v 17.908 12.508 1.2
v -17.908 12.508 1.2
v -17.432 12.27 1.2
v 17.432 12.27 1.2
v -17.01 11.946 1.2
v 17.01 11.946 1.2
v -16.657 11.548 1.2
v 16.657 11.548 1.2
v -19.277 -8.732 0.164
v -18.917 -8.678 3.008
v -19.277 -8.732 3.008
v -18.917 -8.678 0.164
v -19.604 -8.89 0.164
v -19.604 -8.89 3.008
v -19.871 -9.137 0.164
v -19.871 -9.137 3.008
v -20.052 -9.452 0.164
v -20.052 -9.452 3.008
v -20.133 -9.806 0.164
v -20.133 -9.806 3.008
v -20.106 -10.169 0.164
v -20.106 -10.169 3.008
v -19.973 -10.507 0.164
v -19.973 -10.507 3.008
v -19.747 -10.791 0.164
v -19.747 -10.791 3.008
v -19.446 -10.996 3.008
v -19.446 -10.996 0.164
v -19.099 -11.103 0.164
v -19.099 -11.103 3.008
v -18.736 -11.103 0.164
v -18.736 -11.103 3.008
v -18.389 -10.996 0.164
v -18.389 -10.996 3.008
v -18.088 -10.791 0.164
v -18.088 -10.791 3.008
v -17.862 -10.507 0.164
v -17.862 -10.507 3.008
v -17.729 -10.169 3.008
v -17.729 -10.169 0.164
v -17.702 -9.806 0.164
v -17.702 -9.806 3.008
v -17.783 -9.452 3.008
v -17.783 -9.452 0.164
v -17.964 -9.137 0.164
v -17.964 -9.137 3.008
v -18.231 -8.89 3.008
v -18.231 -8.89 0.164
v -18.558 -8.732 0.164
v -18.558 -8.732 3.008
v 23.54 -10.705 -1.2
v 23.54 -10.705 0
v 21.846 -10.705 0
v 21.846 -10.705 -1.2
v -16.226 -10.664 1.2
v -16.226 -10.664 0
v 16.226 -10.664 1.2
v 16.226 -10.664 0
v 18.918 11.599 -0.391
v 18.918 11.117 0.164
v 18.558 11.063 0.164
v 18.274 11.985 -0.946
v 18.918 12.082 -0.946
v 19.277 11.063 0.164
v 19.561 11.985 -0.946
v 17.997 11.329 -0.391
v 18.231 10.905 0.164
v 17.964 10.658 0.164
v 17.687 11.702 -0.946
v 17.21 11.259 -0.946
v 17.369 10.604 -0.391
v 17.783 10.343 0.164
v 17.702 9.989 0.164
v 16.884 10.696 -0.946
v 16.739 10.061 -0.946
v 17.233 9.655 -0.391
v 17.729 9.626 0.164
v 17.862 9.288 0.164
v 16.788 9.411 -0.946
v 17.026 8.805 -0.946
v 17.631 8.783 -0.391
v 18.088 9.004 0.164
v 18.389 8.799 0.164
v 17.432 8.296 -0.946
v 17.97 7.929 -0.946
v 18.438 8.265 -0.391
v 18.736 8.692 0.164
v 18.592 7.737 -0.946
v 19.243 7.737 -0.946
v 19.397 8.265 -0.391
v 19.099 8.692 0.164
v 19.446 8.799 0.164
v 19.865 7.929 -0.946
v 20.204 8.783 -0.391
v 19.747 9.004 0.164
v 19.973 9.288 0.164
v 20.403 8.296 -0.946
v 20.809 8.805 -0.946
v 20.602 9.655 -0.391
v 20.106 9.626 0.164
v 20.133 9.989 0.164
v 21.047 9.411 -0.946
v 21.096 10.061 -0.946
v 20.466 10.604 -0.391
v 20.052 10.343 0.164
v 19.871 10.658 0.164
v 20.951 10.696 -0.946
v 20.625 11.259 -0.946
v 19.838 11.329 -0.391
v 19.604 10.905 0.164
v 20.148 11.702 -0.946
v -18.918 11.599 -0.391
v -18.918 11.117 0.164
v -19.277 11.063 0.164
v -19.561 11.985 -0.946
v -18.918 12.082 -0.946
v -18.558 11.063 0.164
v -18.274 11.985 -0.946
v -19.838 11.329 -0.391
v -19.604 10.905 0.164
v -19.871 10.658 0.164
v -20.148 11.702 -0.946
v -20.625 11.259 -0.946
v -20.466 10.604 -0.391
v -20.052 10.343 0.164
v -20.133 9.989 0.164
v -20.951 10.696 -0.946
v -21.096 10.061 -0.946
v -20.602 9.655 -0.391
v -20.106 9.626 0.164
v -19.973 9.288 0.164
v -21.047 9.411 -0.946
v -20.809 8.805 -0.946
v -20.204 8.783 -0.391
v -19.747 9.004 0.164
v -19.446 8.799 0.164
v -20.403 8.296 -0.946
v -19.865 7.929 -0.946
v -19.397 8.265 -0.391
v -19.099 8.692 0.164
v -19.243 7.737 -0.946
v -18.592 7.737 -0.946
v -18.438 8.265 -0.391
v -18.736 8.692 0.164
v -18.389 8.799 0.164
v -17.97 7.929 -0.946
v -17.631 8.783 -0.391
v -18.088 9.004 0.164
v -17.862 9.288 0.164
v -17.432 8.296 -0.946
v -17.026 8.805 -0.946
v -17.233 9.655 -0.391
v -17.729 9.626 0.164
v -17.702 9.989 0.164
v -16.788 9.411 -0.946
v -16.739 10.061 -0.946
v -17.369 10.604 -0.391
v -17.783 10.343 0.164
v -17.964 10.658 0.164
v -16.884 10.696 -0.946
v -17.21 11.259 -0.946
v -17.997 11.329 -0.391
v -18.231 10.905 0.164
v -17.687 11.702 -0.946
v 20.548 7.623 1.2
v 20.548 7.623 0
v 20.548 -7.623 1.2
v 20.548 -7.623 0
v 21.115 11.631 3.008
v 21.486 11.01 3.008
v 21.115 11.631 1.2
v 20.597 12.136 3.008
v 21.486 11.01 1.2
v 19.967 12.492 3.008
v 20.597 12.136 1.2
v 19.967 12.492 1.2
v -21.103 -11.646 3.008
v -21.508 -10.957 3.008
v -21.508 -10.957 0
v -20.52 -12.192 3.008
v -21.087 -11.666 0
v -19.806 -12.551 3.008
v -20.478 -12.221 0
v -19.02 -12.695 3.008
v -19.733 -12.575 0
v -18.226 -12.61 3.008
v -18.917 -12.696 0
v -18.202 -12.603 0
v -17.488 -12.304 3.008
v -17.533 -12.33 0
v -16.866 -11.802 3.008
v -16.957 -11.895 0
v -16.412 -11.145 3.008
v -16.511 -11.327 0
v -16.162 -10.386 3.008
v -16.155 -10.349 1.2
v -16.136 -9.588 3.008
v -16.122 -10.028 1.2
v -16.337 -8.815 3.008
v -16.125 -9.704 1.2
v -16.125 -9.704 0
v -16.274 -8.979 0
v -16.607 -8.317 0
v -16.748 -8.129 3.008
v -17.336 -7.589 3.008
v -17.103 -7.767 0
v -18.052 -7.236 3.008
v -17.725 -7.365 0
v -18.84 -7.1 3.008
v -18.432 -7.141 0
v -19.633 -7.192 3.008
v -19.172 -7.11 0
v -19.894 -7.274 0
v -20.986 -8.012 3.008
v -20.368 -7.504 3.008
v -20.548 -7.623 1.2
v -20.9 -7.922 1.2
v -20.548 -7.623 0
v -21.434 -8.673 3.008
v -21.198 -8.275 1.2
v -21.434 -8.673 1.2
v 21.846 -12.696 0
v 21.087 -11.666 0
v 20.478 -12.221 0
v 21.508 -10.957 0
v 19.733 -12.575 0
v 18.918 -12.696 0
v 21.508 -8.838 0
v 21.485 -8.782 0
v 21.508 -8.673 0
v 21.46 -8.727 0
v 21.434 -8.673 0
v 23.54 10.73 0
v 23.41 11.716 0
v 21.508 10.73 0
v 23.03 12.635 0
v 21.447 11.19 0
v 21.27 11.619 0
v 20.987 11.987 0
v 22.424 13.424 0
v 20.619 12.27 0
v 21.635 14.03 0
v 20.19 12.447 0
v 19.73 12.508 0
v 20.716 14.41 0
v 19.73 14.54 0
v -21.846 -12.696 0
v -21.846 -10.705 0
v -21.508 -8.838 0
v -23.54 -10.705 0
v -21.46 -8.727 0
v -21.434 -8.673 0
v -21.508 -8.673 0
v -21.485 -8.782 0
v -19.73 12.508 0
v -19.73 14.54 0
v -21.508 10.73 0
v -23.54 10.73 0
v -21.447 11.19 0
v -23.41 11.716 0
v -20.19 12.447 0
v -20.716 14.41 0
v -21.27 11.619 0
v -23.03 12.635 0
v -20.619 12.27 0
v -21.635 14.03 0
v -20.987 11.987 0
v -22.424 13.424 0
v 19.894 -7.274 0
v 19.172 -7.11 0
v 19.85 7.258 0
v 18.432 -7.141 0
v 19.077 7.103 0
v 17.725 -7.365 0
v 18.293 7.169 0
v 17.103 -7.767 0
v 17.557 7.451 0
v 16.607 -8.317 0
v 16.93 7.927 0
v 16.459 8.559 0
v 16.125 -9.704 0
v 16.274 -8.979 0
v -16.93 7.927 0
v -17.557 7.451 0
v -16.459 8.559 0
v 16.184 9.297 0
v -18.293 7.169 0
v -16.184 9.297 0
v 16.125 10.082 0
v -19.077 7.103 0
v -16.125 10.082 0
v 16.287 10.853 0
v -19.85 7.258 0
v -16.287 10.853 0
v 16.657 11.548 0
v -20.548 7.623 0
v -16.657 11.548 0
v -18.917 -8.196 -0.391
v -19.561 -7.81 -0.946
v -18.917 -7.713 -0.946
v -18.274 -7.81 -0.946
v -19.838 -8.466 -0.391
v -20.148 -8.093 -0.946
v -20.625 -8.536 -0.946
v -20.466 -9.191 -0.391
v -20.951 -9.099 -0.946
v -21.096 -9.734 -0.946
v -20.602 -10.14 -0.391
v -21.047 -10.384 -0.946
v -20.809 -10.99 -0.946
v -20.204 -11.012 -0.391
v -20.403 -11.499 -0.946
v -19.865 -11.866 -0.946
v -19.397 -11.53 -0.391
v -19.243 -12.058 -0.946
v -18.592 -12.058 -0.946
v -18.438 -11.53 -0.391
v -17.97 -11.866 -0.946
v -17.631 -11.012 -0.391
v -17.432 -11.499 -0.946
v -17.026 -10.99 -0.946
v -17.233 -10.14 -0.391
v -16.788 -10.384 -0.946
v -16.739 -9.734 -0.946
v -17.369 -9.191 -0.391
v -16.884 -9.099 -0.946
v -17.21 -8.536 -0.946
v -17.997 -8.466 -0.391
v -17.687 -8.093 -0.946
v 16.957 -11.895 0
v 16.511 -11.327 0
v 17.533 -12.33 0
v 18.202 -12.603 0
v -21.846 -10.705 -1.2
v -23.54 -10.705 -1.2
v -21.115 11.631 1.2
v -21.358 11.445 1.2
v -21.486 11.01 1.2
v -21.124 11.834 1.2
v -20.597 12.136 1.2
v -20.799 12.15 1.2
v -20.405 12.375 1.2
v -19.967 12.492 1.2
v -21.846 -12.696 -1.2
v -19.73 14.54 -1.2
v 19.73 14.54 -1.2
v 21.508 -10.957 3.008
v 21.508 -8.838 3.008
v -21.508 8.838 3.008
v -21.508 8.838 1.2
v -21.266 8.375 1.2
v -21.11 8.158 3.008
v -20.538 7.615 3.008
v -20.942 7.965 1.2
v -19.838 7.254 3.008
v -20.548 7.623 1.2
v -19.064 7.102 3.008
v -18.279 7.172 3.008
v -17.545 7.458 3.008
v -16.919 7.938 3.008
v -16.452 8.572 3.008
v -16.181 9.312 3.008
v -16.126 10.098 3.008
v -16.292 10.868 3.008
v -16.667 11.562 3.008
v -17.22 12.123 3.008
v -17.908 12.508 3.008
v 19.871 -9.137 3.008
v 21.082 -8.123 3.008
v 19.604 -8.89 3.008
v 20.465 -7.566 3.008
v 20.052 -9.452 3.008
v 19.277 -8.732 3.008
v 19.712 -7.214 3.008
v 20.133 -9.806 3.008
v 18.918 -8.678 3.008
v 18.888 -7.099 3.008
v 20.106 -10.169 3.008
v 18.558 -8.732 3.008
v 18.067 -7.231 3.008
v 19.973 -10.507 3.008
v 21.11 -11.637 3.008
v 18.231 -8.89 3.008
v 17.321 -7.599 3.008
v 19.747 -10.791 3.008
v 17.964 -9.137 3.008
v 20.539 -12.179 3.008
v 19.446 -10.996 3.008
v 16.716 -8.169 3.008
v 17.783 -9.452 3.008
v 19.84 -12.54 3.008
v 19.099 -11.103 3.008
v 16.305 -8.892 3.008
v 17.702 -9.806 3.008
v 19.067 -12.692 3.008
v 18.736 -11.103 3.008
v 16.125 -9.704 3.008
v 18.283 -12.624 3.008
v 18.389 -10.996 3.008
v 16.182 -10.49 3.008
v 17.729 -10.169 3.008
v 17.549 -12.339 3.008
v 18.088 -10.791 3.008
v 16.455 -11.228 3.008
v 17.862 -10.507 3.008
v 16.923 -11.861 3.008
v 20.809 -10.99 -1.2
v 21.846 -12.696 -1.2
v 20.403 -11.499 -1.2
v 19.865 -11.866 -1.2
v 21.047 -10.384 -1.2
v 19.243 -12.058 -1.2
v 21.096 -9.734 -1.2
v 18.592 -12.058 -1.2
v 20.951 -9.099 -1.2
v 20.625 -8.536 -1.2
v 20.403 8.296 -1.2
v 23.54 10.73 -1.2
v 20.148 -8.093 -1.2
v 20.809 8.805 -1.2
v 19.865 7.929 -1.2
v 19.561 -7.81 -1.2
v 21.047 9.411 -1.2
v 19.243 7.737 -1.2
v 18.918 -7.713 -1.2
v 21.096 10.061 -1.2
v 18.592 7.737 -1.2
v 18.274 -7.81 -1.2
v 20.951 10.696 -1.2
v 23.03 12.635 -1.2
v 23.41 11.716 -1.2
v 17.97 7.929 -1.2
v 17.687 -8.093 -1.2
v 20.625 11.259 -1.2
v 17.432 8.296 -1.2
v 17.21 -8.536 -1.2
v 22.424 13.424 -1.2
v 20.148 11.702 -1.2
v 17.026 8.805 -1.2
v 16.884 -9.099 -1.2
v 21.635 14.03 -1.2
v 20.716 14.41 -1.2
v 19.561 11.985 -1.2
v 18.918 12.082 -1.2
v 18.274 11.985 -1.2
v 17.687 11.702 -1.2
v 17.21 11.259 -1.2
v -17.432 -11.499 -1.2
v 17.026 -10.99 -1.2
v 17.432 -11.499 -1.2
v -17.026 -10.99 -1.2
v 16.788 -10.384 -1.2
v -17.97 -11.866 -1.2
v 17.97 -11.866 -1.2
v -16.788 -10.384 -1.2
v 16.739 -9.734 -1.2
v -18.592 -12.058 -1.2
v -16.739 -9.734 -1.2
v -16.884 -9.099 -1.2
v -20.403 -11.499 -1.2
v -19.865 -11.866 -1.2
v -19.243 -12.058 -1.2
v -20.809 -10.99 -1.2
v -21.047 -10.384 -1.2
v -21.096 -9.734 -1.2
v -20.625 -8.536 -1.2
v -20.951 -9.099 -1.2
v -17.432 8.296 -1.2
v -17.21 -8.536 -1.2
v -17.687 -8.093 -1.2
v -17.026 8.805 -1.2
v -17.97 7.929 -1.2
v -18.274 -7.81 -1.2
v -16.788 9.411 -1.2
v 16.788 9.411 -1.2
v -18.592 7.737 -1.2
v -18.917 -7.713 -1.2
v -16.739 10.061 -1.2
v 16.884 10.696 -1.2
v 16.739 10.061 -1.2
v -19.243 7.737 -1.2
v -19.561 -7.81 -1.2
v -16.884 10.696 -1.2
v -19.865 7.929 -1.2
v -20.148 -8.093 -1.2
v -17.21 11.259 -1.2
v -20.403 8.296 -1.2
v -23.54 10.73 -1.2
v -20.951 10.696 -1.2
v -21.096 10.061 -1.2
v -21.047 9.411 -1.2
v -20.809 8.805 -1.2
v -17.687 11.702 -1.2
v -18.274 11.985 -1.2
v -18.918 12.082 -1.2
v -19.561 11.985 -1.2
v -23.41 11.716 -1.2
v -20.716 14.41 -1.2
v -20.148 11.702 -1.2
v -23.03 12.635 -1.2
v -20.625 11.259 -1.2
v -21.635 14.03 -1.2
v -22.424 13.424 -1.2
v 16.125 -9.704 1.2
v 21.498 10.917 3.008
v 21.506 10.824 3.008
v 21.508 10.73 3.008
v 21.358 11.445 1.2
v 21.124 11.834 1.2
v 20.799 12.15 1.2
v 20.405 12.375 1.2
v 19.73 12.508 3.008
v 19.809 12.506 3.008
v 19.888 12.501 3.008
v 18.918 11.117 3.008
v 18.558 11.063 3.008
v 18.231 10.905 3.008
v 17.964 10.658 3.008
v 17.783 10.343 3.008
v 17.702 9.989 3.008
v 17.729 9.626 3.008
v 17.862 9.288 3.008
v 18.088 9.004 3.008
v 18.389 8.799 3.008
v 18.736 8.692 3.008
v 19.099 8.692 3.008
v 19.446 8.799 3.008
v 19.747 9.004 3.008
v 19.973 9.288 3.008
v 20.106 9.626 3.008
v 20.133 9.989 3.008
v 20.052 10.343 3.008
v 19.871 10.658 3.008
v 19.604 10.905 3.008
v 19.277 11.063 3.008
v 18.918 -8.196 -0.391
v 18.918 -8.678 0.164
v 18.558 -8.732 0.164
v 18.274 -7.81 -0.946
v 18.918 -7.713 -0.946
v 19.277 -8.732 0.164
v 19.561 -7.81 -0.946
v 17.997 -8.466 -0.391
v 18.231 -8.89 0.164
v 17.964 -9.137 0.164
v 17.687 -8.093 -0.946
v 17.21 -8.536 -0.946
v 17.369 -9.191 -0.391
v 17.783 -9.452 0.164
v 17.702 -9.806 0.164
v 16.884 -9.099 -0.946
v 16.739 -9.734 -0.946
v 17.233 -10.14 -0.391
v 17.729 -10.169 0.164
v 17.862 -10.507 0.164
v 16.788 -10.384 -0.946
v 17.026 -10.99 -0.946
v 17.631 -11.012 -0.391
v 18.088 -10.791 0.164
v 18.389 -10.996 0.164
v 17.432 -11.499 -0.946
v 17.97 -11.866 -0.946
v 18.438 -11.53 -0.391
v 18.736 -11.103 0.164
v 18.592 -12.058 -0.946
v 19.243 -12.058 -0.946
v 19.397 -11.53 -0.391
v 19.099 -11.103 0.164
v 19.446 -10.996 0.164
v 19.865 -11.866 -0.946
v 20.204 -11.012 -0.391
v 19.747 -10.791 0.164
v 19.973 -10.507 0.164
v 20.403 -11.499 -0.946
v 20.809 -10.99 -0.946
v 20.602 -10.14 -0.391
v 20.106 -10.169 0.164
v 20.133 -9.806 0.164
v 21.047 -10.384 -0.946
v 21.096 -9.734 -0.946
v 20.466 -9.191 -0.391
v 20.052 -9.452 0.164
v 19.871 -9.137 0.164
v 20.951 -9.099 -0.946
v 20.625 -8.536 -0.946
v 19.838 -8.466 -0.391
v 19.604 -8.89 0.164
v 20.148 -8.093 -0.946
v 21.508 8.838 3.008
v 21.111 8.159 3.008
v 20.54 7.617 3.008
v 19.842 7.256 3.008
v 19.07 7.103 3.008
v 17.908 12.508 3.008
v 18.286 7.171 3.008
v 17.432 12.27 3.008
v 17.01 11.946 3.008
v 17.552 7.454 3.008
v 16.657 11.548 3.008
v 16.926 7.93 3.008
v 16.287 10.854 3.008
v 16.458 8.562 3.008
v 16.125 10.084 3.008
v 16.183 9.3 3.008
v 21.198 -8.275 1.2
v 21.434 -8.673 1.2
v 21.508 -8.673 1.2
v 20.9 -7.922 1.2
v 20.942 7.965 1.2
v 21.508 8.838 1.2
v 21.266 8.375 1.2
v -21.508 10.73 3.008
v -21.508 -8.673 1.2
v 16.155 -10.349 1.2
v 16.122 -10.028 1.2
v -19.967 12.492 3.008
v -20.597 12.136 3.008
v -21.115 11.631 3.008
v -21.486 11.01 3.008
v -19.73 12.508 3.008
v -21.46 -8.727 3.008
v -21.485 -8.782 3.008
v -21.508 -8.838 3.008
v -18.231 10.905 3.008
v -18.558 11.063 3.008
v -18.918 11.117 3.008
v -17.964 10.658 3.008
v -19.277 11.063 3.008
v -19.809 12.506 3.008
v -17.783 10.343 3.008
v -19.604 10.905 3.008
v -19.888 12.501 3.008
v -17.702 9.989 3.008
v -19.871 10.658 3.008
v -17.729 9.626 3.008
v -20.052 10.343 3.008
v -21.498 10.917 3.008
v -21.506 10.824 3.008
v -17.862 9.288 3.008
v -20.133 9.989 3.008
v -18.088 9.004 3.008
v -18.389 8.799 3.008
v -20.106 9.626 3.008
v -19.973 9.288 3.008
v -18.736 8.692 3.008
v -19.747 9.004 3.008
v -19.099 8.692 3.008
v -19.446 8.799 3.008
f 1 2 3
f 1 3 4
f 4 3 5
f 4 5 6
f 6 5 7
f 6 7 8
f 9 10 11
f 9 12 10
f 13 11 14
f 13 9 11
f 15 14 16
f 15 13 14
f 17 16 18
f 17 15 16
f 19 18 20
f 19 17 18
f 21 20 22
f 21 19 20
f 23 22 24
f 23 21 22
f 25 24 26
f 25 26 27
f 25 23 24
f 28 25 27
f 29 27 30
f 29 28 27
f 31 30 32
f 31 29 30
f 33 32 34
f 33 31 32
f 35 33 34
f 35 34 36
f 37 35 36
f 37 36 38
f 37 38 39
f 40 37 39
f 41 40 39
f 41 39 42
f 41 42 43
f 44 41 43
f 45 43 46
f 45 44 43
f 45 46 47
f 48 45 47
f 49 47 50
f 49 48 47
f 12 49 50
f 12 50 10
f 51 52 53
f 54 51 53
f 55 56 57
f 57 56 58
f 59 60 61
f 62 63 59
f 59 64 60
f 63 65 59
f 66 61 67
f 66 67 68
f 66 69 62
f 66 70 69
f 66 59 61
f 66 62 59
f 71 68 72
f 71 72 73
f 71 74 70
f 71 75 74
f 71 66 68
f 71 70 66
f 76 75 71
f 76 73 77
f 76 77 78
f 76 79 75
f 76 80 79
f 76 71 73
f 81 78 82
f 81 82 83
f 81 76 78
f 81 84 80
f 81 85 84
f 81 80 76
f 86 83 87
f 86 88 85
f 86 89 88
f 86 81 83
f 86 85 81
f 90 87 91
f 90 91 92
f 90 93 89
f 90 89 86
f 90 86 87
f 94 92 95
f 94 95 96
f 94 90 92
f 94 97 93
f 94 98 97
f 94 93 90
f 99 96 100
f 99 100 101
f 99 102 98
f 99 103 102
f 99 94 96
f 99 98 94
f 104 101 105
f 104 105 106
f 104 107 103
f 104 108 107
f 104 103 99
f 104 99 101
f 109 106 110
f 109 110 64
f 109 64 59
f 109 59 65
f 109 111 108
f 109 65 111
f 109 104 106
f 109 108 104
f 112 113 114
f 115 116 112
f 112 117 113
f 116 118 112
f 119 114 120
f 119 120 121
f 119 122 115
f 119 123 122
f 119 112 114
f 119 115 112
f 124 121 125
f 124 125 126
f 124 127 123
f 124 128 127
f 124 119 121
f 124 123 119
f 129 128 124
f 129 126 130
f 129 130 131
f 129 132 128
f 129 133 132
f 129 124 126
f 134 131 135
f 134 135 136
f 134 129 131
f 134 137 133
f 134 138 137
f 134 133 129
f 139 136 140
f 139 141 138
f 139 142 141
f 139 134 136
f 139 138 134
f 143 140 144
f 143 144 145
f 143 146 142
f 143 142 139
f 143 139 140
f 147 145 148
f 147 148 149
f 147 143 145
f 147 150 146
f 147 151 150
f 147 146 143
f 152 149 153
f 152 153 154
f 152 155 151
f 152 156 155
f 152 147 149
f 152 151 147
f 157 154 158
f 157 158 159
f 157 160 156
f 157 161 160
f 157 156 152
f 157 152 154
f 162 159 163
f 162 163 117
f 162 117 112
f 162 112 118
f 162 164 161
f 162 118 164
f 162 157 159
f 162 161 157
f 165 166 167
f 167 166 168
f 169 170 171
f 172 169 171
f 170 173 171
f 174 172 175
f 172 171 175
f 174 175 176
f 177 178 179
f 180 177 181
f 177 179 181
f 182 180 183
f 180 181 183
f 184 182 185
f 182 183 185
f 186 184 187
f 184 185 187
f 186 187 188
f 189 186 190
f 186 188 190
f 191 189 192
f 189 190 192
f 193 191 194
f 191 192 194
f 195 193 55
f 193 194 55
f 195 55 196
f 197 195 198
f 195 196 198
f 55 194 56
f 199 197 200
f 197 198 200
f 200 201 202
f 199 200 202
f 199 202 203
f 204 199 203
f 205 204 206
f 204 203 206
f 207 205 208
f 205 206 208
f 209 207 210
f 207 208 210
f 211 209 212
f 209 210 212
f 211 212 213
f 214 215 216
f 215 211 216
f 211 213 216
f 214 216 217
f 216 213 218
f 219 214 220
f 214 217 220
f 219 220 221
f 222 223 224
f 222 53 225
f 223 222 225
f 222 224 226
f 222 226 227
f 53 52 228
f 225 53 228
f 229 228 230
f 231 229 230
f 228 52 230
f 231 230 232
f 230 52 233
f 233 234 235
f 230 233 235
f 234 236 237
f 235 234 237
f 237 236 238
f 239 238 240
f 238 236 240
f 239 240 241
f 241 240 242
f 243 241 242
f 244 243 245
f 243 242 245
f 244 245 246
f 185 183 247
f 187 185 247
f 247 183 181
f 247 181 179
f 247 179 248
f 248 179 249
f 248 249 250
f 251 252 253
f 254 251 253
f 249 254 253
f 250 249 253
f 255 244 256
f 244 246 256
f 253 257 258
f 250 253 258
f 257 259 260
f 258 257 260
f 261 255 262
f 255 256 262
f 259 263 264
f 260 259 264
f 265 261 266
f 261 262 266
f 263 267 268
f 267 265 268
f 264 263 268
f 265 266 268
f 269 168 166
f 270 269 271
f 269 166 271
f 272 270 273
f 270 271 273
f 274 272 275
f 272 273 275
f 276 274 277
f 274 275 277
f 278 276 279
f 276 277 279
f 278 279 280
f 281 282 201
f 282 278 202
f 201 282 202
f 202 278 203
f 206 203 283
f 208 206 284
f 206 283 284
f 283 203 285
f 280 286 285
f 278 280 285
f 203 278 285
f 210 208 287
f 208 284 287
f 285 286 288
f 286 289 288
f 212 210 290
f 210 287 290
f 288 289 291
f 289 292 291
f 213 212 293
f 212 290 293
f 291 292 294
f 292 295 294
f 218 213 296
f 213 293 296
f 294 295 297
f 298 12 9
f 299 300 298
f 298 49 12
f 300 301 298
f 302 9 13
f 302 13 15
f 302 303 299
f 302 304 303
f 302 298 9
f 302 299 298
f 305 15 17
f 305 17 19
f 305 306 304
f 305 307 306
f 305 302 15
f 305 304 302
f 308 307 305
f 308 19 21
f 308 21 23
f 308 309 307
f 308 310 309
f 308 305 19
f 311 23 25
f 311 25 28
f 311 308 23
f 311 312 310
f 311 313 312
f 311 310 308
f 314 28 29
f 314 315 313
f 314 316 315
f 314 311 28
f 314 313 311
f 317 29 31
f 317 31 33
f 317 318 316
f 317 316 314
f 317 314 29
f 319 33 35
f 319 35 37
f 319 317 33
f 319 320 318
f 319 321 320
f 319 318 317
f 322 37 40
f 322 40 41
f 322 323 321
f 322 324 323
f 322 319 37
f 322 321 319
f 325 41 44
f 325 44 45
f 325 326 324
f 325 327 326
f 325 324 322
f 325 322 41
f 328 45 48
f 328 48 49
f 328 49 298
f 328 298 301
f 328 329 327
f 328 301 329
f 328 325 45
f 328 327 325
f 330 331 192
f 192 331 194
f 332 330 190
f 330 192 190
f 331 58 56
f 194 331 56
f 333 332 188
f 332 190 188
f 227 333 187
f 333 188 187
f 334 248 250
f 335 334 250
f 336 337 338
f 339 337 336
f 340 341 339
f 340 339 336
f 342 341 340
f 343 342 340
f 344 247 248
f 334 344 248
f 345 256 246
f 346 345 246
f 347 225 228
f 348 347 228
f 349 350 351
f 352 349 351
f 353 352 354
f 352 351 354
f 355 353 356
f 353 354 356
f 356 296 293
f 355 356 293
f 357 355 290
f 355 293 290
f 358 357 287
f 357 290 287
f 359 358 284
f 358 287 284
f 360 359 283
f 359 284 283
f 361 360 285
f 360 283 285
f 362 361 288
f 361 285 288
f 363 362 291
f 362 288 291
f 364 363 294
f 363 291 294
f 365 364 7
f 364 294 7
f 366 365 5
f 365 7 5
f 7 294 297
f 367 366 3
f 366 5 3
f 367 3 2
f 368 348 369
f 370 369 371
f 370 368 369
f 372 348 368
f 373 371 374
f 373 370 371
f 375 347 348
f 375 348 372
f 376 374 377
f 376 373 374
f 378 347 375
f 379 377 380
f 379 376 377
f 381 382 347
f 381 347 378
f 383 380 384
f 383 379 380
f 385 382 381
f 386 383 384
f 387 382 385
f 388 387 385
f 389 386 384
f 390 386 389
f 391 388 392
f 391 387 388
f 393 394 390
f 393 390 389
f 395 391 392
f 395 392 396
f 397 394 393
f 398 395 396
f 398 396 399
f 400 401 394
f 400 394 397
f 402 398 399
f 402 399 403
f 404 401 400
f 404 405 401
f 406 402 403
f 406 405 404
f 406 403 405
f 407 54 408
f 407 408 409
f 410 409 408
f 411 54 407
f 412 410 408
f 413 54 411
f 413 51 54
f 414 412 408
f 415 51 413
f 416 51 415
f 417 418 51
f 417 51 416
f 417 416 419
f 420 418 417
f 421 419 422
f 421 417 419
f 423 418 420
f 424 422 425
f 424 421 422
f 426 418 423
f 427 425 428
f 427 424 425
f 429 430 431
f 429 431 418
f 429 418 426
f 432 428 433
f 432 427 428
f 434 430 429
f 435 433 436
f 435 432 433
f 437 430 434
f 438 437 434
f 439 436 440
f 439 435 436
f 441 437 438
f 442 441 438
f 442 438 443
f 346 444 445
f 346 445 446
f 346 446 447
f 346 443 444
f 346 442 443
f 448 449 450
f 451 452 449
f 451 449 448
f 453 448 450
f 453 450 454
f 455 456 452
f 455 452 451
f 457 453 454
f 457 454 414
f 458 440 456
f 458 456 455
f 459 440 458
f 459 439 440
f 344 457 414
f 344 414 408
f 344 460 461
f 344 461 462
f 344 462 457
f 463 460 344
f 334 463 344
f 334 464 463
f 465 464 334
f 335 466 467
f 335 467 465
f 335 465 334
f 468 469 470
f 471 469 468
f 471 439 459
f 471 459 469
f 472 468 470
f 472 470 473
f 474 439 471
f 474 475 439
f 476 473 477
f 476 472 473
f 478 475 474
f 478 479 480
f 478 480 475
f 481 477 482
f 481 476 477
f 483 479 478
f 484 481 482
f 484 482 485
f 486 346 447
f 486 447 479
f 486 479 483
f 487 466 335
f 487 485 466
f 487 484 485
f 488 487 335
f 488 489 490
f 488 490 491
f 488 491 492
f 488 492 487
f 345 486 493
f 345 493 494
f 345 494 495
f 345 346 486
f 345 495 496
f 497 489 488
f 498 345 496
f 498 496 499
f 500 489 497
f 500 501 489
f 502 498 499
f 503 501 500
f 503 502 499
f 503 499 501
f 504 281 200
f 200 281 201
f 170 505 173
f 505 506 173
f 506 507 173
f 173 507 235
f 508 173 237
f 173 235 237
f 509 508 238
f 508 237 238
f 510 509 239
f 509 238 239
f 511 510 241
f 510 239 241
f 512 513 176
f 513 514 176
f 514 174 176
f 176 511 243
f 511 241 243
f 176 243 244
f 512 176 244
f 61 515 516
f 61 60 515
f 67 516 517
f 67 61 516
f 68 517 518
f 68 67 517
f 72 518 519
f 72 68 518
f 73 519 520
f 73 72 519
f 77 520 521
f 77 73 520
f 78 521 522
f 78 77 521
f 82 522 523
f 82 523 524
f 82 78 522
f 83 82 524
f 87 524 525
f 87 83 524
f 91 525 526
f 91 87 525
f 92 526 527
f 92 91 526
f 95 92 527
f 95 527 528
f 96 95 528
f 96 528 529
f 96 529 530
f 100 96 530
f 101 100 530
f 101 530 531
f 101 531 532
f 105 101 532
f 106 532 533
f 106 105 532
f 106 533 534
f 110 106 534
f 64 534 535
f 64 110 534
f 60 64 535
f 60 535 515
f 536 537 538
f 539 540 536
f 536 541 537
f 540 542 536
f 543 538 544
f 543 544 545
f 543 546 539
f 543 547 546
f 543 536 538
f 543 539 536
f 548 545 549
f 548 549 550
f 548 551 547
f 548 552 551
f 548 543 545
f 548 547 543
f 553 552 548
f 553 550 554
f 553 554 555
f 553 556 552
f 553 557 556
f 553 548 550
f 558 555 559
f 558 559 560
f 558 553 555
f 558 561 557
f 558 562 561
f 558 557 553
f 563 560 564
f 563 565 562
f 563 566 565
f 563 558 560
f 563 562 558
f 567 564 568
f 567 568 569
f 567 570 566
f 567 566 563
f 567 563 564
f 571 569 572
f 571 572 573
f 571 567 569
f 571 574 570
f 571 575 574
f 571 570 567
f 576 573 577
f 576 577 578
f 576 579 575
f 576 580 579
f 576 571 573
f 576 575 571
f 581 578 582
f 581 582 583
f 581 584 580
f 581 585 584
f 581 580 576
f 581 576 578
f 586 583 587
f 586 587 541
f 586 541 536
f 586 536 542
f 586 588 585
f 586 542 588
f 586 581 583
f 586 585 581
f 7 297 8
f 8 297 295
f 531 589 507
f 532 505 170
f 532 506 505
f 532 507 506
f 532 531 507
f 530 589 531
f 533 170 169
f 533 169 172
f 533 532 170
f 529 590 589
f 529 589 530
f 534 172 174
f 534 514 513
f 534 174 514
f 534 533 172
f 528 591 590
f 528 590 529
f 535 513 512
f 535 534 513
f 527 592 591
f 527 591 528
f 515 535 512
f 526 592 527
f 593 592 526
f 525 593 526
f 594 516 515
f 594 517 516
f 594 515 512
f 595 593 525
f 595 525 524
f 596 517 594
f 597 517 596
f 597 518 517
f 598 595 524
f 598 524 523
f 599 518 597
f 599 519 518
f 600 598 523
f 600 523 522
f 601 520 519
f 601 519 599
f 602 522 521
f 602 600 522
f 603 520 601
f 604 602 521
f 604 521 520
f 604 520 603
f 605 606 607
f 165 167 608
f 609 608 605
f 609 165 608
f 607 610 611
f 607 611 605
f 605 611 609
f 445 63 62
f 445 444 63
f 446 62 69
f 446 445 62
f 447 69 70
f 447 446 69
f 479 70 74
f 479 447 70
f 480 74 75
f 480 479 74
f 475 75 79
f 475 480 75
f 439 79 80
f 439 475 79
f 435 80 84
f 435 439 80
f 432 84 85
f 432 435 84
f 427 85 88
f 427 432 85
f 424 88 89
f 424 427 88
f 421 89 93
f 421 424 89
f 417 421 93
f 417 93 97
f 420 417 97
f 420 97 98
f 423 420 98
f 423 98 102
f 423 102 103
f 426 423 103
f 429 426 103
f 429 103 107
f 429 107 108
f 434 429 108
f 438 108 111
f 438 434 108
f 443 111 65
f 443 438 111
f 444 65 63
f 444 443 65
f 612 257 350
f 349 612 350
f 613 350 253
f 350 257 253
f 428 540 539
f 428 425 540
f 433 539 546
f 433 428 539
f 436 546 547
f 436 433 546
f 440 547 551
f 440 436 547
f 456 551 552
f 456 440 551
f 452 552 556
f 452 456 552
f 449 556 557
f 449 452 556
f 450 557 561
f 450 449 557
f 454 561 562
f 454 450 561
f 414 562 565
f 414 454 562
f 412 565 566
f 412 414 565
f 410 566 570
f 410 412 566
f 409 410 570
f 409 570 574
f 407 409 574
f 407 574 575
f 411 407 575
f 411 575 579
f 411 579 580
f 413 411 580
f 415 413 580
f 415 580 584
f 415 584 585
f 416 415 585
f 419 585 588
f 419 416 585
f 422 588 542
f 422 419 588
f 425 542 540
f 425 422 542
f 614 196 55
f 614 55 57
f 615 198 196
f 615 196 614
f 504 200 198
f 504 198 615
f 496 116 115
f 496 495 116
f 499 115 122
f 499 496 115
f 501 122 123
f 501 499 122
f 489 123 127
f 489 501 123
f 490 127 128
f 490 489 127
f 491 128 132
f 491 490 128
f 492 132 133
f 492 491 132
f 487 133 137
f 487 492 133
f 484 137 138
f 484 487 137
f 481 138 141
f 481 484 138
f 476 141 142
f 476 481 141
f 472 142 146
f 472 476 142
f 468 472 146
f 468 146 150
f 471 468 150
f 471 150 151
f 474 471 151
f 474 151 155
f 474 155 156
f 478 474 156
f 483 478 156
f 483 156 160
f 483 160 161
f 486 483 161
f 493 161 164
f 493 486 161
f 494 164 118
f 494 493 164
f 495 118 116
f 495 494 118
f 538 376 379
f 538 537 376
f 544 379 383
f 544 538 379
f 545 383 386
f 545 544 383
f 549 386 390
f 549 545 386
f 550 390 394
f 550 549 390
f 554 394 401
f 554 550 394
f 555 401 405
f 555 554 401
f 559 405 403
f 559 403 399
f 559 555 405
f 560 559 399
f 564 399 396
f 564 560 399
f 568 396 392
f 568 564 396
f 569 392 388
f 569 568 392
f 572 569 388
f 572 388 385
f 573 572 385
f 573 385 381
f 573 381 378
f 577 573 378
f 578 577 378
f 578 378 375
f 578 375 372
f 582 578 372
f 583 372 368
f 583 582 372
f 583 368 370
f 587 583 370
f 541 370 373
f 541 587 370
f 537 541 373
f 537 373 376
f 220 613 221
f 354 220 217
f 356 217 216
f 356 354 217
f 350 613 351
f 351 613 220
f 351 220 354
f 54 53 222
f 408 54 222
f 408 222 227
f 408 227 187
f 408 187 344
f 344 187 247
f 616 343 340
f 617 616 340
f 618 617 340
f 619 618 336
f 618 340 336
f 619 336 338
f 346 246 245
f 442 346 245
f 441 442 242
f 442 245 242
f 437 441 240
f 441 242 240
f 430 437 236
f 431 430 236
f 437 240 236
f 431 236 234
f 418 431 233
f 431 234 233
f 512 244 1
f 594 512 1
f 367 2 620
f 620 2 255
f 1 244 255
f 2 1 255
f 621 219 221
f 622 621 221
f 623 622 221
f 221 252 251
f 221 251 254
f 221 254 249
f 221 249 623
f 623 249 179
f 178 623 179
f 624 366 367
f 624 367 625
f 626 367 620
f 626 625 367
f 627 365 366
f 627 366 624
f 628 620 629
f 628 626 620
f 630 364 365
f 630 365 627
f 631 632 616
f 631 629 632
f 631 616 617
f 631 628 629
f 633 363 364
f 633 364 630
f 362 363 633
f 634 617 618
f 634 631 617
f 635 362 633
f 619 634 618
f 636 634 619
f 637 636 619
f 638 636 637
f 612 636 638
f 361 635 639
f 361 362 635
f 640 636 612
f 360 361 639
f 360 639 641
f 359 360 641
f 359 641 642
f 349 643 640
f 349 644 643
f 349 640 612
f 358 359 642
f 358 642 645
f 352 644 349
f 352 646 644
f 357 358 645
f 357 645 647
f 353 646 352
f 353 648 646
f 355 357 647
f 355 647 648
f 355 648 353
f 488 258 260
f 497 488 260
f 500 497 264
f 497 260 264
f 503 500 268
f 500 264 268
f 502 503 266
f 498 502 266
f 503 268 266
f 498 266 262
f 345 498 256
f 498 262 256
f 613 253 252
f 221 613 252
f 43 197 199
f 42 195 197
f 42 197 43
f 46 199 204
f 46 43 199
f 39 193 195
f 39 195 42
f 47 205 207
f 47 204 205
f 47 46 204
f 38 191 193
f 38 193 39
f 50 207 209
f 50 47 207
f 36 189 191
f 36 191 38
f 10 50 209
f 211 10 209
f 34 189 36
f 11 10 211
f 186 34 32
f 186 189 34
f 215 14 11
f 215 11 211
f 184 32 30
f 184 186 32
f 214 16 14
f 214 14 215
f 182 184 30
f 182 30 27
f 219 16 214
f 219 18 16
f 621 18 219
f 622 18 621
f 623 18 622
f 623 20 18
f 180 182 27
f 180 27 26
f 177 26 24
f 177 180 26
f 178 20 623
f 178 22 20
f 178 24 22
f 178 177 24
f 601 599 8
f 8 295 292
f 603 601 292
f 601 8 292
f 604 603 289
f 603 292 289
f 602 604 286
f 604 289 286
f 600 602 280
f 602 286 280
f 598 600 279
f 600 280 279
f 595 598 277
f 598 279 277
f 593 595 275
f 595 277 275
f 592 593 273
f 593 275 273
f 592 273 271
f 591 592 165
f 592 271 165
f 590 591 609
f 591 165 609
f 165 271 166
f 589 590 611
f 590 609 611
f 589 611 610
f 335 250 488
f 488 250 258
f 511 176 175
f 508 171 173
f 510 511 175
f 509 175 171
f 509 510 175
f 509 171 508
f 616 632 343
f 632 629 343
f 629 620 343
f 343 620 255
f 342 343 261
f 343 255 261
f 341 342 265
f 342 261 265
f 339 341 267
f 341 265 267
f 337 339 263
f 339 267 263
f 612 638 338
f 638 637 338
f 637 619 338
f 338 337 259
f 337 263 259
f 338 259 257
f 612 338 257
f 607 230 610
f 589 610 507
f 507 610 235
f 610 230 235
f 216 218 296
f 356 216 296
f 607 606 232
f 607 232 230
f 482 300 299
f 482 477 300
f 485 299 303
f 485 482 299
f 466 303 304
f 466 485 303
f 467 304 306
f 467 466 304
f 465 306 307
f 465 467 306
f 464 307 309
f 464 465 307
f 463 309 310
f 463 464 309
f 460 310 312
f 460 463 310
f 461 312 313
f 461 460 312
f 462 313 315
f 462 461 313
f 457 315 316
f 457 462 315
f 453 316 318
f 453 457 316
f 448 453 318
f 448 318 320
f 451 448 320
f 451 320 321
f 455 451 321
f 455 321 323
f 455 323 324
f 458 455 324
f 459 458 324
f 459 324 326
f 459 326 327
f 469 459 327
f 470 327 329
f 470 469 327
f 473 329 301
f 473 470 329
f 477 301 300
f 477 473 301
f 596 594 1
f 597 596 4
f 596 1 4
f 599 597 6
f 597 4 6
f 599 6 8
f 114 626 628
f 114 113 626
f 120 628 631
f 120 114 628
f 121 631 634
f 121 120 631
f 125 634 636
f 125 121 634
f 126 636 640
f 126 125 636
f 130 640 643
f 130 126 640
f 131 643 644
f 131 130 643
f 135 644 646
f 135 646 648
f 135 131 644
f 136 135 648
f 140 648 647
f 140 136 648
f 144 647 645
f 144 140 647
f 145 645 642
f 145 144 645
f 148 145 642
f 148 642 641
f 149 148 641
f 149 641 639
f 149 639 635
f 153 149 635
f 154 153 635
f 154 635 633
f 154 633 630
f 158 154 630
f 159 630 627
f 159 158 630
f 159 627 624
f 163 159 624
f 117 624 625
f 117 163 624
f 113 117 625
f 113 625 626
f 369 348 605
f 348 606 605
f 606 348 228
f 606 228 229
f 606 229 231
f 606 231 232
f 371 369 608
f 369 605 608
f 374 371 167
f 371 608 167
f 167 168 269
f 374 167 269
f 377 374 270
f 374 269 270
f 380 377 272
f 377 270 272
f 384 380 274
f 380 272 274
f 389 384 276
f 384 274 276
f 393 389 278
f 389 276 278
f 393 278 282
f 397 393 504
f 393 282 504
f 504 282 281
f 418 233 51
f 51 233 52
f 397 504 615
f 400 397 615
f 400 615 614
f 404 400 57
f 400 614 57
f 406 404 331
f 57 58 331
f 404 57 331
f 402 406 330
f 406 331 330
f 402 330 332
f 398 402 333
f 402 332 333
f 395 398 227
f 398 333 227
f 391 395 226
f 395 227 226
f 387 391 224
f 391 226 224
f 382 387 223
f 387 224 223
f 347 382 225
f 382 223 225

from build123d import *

# Parameters (mm, degrees)
EXTRUDE1_DEPTH                                = 1.2
EXTRUDE_THIN1_DEPTH                           = 1.2
SKETCH9_R                                     = 2.7989
EXTRUDE3_DEPTH                                = 3.008
SKETCH11_OUTSIDE_W                            = 59.99
SKETCH11_OUTSIDE_H                            = 40.146
CUT_EXTRUDE2_DEPTH                            = 28.831479731
CSK_FOR_2_FLAT_HEAD_MACHINE_SCREW1_AT_2_COUNT = 2
CSK_FOR_2_FLAT_HEAD_MACHINE_SCREW1_AT_2_PITCH = 19.795
CSK_FOR_2_FLAT_HEAD_MACHINE_SCREW1_AT_3_COUNT = 2
CSK_FOR_2_FLAT_HEAD_MACHINE_SCREW1_AT_3_PITCH = 42.700459599
CSK_FOR_2_FLAT_HEAD_MACHINE_SCREW1_AT_4_COUNT = 2
CSK_FOR_2_FLAT_HEAD_MACHINE_SCREW1_AT_4_PITCH = 37.835


with BuildPart() as part:
    # Sketch2 → Extrude1 (new body)
    with BuildSketch(Plane.XY):
        with BuildLine():
            Line((22.1, -10.7046), (21.846, -10.7046))
            Line((21.846, -10.7046), (21.846, -12.6964))
            Line((21.846, -12.6964), (-21.846, -12.6964))
            Line((-21.846, -12.6964), (-21.846, -10.7046))
            Line((-21.846, -10.7046), (-22.1, -10.7046))
            Line((-22.1, -10.7046), (-23.54, -10.7046))
            Line((-23.54, -10.7046), (-23.54, 10.73))
            ThreePointArc((-23.54, 10.73), (-22.424076836, 13.424076836), (-19.73, 14.54))
            Line((-19.73, 14.54), (19.73, 14.54))
            ThreePointArc((19.73, 14.54), (22.424076836, 13.424076836), (23.54, 10.73))
            Line((23.54, 10.73), (23.54, -10.7046))
            Line((23.54, -10.7046), (22.1, -10.7046))
        make_face()
    extrude(amount=-EXTRUDE1_DEPTH)

    # Sketch3 → Extrude-Thin1 (add)
    with BuildSketch(Plane.XY):
        with BuildLine():
            Line((-19.814, -8.6726), (-19.814, -10.6644))
            Line((-19.814, -10.6644), (19.814, -10.6644))
            Line((19.814, -10.6644), (19.814, -8.6726))
            Line((19.814, -8.6726), (21.508, -8.6726))
            Line((21.508, -8.6726), (21.508, 10.73))
            ThreePointArc((21.508, 10.73), (20.987235857, 11.987235857), (19.73, 12.508))
            Line((19.73, 12.508), (-19.73, 12.508))
            ThreePointArc((-19.73, 12.508), (-20.987235857, 11.987235857), (-21.508, 10.73))
            Line((-21.508, 10.73), (-21.508, -8.6726))
            Line((-21.508, -8.6726), (-20.548, -8.6726))
            Line((-20.548, -8.6726), (-20.548, 10.73))
            ThreePointArc((-20.548, 10.73), (-20.308413347, 11.308413347), (-19.73, 11.548))
            Line((-19.73, 11.548), (19.73, 11.548))
            ThreePointArc((19.73, 11.548), (20.308413347, 11.308413347), (20.548, 10.73))
            Line((20.548, 10.73), (20.548, -7.7126))
            Line((20.548, -7.7126), (18.854, -7.7126))
            Line((18.854, -7.7126), (18.854, -9.7044))
            Line((18.854, -9.7044), (-18.854, -9.7044))
            Line((-18.854, -9.7044), (-18.854, -8.6726))
            Line((-18.854, -8.6726), (-19.814, -8.6726))
        make_face()
    extrude(amount=EXTRUDE_THIN1_DEPTH)

    # Sketch9 → Extrude3 (add)
    with BuildSketch(Plane.XY):
        with Locations(Location((18.9175, -9.8975, 0), (0, 0, 176.043941969))):
            Circle(SKETCH9_R)
        with Locations(Location((-18.9175, -9.8975, 0), (0, 0, 154.046840703))):
            Circle(SKETCH9_R)
        with Locations(Location((-18.9175, 9.8975, 0), (0, 0, 202.249746806))):
            Circle(SKETCH9_R)
        with Locations(Location((18.9175, 9.8975, 0), (0, 0, 143.864565))):
            Circle(SKETCH9_R)
    extrude(amount=EXTRUDE3_DEPTH)

    # Sketch11 outside → Cut-Extrude2 (cut, through all)
    with BuildSketch(Plane.XY):
        with Locations((0, 0.922)):
            Rectangle(SKETCH11_OUTSIDE_W, SKETCH11_OUTSIDE_H)
        with BuildLine():
            Line((-21.508, 10.73), (-21.508, -12.6964))
            Line((-21.508, -12.6964), (21.508, -12.6964))
            Line((21.508, -12.6964), (21.508, 10.73))
            ThreePointArc((21.508, 10.73), (20.987235857, 11.987235857), (19.73, 12.508))
            Line((19.73, 12.508), (-19.73, 12.508))
            ThreePointArc((-19.73, 12.508), (-20.987235857, 11.987235857), (-21.508, 10.73))
        make_face(mode=Mode.SUBTRACT)
    extrude(amount=CUT_EXTRUDE2_DEPTH, mode=Mode.SUBTRACT)

    # Sketch7 → CSK for #2 Flat Head Machine Screw1 (revolve, cut)
    with BuildSketch(Plane(origin=(18.9175, 9.8975, -1.2), x_dir=(0, 1, 0), z_dir=(1, 0, 0))):
        Polygon((0, 0), (0, 4.208), (1.2192, 4.208), (1.2192, 1.364335587), (2.1844, 0.254), (2.1844, 0), align=None)
    csk_for_2_flat_head_machine_screw1 = revolve(axis=Axis((18.9175, 9.8975, -7.55), (0, 0, 1)), mode=Mode.SUBTRACT)

    # CSK for #2 Flat Head Machine Screw1 at 2: CSK for #2 Flat Head Machine Screw1 ×2
    with Locations(*[(0, -i * CSK_FOR_2_FLAT_HEAD_MACHINE_SCREW1_AT_2_PITCH, 0) for i in range(1, CSK_FOR_2_FLAT_HEAD_MACHINE_SCREW1_AT_2_COUNT)]):
        add(csk_for_2_flat_head_machine_screw1, mode=Mode.SUBTRACT)

    # CSK for #2 Flat Head Machine Screw1 at 3: CSK for #2 Flat Head Machine Screw1 ×2
    with Locations(*[Vector(-0.8860560367488772, -0.46357814847215617, 0) * (i * CSK_FOR_2_FLAT_HEAD_MACHINE_SCREW1_AT_3_PITCH) for i in range(1, CSK_FOR_2_FLAT_HEAD_MACHINE_SCREW1_AT_3_COUNT)]):
        add(csk_for_2_flat_head_machine_screw1, mode=Mode.SUBTRACT)

    # CSK for #2 Flat Head Machine Screw1 at 4: CSK for #2 Flat Head Machine Screw1 ×2
    with Locations(*[(-i * CSK_FOR_2_FLAT_HEAD_MACHINE_SCREW1_AT_4_PITCH, 0, 0) for i in range(1, CSK_FOR_2_FLAT_HEAD_MACHINE_SCREW1_AT_4_COUNT)]):
        add(csk_for_2_flat_head_machine_screw1, mode=Mode.SUBTRACT)


solid = part.part
